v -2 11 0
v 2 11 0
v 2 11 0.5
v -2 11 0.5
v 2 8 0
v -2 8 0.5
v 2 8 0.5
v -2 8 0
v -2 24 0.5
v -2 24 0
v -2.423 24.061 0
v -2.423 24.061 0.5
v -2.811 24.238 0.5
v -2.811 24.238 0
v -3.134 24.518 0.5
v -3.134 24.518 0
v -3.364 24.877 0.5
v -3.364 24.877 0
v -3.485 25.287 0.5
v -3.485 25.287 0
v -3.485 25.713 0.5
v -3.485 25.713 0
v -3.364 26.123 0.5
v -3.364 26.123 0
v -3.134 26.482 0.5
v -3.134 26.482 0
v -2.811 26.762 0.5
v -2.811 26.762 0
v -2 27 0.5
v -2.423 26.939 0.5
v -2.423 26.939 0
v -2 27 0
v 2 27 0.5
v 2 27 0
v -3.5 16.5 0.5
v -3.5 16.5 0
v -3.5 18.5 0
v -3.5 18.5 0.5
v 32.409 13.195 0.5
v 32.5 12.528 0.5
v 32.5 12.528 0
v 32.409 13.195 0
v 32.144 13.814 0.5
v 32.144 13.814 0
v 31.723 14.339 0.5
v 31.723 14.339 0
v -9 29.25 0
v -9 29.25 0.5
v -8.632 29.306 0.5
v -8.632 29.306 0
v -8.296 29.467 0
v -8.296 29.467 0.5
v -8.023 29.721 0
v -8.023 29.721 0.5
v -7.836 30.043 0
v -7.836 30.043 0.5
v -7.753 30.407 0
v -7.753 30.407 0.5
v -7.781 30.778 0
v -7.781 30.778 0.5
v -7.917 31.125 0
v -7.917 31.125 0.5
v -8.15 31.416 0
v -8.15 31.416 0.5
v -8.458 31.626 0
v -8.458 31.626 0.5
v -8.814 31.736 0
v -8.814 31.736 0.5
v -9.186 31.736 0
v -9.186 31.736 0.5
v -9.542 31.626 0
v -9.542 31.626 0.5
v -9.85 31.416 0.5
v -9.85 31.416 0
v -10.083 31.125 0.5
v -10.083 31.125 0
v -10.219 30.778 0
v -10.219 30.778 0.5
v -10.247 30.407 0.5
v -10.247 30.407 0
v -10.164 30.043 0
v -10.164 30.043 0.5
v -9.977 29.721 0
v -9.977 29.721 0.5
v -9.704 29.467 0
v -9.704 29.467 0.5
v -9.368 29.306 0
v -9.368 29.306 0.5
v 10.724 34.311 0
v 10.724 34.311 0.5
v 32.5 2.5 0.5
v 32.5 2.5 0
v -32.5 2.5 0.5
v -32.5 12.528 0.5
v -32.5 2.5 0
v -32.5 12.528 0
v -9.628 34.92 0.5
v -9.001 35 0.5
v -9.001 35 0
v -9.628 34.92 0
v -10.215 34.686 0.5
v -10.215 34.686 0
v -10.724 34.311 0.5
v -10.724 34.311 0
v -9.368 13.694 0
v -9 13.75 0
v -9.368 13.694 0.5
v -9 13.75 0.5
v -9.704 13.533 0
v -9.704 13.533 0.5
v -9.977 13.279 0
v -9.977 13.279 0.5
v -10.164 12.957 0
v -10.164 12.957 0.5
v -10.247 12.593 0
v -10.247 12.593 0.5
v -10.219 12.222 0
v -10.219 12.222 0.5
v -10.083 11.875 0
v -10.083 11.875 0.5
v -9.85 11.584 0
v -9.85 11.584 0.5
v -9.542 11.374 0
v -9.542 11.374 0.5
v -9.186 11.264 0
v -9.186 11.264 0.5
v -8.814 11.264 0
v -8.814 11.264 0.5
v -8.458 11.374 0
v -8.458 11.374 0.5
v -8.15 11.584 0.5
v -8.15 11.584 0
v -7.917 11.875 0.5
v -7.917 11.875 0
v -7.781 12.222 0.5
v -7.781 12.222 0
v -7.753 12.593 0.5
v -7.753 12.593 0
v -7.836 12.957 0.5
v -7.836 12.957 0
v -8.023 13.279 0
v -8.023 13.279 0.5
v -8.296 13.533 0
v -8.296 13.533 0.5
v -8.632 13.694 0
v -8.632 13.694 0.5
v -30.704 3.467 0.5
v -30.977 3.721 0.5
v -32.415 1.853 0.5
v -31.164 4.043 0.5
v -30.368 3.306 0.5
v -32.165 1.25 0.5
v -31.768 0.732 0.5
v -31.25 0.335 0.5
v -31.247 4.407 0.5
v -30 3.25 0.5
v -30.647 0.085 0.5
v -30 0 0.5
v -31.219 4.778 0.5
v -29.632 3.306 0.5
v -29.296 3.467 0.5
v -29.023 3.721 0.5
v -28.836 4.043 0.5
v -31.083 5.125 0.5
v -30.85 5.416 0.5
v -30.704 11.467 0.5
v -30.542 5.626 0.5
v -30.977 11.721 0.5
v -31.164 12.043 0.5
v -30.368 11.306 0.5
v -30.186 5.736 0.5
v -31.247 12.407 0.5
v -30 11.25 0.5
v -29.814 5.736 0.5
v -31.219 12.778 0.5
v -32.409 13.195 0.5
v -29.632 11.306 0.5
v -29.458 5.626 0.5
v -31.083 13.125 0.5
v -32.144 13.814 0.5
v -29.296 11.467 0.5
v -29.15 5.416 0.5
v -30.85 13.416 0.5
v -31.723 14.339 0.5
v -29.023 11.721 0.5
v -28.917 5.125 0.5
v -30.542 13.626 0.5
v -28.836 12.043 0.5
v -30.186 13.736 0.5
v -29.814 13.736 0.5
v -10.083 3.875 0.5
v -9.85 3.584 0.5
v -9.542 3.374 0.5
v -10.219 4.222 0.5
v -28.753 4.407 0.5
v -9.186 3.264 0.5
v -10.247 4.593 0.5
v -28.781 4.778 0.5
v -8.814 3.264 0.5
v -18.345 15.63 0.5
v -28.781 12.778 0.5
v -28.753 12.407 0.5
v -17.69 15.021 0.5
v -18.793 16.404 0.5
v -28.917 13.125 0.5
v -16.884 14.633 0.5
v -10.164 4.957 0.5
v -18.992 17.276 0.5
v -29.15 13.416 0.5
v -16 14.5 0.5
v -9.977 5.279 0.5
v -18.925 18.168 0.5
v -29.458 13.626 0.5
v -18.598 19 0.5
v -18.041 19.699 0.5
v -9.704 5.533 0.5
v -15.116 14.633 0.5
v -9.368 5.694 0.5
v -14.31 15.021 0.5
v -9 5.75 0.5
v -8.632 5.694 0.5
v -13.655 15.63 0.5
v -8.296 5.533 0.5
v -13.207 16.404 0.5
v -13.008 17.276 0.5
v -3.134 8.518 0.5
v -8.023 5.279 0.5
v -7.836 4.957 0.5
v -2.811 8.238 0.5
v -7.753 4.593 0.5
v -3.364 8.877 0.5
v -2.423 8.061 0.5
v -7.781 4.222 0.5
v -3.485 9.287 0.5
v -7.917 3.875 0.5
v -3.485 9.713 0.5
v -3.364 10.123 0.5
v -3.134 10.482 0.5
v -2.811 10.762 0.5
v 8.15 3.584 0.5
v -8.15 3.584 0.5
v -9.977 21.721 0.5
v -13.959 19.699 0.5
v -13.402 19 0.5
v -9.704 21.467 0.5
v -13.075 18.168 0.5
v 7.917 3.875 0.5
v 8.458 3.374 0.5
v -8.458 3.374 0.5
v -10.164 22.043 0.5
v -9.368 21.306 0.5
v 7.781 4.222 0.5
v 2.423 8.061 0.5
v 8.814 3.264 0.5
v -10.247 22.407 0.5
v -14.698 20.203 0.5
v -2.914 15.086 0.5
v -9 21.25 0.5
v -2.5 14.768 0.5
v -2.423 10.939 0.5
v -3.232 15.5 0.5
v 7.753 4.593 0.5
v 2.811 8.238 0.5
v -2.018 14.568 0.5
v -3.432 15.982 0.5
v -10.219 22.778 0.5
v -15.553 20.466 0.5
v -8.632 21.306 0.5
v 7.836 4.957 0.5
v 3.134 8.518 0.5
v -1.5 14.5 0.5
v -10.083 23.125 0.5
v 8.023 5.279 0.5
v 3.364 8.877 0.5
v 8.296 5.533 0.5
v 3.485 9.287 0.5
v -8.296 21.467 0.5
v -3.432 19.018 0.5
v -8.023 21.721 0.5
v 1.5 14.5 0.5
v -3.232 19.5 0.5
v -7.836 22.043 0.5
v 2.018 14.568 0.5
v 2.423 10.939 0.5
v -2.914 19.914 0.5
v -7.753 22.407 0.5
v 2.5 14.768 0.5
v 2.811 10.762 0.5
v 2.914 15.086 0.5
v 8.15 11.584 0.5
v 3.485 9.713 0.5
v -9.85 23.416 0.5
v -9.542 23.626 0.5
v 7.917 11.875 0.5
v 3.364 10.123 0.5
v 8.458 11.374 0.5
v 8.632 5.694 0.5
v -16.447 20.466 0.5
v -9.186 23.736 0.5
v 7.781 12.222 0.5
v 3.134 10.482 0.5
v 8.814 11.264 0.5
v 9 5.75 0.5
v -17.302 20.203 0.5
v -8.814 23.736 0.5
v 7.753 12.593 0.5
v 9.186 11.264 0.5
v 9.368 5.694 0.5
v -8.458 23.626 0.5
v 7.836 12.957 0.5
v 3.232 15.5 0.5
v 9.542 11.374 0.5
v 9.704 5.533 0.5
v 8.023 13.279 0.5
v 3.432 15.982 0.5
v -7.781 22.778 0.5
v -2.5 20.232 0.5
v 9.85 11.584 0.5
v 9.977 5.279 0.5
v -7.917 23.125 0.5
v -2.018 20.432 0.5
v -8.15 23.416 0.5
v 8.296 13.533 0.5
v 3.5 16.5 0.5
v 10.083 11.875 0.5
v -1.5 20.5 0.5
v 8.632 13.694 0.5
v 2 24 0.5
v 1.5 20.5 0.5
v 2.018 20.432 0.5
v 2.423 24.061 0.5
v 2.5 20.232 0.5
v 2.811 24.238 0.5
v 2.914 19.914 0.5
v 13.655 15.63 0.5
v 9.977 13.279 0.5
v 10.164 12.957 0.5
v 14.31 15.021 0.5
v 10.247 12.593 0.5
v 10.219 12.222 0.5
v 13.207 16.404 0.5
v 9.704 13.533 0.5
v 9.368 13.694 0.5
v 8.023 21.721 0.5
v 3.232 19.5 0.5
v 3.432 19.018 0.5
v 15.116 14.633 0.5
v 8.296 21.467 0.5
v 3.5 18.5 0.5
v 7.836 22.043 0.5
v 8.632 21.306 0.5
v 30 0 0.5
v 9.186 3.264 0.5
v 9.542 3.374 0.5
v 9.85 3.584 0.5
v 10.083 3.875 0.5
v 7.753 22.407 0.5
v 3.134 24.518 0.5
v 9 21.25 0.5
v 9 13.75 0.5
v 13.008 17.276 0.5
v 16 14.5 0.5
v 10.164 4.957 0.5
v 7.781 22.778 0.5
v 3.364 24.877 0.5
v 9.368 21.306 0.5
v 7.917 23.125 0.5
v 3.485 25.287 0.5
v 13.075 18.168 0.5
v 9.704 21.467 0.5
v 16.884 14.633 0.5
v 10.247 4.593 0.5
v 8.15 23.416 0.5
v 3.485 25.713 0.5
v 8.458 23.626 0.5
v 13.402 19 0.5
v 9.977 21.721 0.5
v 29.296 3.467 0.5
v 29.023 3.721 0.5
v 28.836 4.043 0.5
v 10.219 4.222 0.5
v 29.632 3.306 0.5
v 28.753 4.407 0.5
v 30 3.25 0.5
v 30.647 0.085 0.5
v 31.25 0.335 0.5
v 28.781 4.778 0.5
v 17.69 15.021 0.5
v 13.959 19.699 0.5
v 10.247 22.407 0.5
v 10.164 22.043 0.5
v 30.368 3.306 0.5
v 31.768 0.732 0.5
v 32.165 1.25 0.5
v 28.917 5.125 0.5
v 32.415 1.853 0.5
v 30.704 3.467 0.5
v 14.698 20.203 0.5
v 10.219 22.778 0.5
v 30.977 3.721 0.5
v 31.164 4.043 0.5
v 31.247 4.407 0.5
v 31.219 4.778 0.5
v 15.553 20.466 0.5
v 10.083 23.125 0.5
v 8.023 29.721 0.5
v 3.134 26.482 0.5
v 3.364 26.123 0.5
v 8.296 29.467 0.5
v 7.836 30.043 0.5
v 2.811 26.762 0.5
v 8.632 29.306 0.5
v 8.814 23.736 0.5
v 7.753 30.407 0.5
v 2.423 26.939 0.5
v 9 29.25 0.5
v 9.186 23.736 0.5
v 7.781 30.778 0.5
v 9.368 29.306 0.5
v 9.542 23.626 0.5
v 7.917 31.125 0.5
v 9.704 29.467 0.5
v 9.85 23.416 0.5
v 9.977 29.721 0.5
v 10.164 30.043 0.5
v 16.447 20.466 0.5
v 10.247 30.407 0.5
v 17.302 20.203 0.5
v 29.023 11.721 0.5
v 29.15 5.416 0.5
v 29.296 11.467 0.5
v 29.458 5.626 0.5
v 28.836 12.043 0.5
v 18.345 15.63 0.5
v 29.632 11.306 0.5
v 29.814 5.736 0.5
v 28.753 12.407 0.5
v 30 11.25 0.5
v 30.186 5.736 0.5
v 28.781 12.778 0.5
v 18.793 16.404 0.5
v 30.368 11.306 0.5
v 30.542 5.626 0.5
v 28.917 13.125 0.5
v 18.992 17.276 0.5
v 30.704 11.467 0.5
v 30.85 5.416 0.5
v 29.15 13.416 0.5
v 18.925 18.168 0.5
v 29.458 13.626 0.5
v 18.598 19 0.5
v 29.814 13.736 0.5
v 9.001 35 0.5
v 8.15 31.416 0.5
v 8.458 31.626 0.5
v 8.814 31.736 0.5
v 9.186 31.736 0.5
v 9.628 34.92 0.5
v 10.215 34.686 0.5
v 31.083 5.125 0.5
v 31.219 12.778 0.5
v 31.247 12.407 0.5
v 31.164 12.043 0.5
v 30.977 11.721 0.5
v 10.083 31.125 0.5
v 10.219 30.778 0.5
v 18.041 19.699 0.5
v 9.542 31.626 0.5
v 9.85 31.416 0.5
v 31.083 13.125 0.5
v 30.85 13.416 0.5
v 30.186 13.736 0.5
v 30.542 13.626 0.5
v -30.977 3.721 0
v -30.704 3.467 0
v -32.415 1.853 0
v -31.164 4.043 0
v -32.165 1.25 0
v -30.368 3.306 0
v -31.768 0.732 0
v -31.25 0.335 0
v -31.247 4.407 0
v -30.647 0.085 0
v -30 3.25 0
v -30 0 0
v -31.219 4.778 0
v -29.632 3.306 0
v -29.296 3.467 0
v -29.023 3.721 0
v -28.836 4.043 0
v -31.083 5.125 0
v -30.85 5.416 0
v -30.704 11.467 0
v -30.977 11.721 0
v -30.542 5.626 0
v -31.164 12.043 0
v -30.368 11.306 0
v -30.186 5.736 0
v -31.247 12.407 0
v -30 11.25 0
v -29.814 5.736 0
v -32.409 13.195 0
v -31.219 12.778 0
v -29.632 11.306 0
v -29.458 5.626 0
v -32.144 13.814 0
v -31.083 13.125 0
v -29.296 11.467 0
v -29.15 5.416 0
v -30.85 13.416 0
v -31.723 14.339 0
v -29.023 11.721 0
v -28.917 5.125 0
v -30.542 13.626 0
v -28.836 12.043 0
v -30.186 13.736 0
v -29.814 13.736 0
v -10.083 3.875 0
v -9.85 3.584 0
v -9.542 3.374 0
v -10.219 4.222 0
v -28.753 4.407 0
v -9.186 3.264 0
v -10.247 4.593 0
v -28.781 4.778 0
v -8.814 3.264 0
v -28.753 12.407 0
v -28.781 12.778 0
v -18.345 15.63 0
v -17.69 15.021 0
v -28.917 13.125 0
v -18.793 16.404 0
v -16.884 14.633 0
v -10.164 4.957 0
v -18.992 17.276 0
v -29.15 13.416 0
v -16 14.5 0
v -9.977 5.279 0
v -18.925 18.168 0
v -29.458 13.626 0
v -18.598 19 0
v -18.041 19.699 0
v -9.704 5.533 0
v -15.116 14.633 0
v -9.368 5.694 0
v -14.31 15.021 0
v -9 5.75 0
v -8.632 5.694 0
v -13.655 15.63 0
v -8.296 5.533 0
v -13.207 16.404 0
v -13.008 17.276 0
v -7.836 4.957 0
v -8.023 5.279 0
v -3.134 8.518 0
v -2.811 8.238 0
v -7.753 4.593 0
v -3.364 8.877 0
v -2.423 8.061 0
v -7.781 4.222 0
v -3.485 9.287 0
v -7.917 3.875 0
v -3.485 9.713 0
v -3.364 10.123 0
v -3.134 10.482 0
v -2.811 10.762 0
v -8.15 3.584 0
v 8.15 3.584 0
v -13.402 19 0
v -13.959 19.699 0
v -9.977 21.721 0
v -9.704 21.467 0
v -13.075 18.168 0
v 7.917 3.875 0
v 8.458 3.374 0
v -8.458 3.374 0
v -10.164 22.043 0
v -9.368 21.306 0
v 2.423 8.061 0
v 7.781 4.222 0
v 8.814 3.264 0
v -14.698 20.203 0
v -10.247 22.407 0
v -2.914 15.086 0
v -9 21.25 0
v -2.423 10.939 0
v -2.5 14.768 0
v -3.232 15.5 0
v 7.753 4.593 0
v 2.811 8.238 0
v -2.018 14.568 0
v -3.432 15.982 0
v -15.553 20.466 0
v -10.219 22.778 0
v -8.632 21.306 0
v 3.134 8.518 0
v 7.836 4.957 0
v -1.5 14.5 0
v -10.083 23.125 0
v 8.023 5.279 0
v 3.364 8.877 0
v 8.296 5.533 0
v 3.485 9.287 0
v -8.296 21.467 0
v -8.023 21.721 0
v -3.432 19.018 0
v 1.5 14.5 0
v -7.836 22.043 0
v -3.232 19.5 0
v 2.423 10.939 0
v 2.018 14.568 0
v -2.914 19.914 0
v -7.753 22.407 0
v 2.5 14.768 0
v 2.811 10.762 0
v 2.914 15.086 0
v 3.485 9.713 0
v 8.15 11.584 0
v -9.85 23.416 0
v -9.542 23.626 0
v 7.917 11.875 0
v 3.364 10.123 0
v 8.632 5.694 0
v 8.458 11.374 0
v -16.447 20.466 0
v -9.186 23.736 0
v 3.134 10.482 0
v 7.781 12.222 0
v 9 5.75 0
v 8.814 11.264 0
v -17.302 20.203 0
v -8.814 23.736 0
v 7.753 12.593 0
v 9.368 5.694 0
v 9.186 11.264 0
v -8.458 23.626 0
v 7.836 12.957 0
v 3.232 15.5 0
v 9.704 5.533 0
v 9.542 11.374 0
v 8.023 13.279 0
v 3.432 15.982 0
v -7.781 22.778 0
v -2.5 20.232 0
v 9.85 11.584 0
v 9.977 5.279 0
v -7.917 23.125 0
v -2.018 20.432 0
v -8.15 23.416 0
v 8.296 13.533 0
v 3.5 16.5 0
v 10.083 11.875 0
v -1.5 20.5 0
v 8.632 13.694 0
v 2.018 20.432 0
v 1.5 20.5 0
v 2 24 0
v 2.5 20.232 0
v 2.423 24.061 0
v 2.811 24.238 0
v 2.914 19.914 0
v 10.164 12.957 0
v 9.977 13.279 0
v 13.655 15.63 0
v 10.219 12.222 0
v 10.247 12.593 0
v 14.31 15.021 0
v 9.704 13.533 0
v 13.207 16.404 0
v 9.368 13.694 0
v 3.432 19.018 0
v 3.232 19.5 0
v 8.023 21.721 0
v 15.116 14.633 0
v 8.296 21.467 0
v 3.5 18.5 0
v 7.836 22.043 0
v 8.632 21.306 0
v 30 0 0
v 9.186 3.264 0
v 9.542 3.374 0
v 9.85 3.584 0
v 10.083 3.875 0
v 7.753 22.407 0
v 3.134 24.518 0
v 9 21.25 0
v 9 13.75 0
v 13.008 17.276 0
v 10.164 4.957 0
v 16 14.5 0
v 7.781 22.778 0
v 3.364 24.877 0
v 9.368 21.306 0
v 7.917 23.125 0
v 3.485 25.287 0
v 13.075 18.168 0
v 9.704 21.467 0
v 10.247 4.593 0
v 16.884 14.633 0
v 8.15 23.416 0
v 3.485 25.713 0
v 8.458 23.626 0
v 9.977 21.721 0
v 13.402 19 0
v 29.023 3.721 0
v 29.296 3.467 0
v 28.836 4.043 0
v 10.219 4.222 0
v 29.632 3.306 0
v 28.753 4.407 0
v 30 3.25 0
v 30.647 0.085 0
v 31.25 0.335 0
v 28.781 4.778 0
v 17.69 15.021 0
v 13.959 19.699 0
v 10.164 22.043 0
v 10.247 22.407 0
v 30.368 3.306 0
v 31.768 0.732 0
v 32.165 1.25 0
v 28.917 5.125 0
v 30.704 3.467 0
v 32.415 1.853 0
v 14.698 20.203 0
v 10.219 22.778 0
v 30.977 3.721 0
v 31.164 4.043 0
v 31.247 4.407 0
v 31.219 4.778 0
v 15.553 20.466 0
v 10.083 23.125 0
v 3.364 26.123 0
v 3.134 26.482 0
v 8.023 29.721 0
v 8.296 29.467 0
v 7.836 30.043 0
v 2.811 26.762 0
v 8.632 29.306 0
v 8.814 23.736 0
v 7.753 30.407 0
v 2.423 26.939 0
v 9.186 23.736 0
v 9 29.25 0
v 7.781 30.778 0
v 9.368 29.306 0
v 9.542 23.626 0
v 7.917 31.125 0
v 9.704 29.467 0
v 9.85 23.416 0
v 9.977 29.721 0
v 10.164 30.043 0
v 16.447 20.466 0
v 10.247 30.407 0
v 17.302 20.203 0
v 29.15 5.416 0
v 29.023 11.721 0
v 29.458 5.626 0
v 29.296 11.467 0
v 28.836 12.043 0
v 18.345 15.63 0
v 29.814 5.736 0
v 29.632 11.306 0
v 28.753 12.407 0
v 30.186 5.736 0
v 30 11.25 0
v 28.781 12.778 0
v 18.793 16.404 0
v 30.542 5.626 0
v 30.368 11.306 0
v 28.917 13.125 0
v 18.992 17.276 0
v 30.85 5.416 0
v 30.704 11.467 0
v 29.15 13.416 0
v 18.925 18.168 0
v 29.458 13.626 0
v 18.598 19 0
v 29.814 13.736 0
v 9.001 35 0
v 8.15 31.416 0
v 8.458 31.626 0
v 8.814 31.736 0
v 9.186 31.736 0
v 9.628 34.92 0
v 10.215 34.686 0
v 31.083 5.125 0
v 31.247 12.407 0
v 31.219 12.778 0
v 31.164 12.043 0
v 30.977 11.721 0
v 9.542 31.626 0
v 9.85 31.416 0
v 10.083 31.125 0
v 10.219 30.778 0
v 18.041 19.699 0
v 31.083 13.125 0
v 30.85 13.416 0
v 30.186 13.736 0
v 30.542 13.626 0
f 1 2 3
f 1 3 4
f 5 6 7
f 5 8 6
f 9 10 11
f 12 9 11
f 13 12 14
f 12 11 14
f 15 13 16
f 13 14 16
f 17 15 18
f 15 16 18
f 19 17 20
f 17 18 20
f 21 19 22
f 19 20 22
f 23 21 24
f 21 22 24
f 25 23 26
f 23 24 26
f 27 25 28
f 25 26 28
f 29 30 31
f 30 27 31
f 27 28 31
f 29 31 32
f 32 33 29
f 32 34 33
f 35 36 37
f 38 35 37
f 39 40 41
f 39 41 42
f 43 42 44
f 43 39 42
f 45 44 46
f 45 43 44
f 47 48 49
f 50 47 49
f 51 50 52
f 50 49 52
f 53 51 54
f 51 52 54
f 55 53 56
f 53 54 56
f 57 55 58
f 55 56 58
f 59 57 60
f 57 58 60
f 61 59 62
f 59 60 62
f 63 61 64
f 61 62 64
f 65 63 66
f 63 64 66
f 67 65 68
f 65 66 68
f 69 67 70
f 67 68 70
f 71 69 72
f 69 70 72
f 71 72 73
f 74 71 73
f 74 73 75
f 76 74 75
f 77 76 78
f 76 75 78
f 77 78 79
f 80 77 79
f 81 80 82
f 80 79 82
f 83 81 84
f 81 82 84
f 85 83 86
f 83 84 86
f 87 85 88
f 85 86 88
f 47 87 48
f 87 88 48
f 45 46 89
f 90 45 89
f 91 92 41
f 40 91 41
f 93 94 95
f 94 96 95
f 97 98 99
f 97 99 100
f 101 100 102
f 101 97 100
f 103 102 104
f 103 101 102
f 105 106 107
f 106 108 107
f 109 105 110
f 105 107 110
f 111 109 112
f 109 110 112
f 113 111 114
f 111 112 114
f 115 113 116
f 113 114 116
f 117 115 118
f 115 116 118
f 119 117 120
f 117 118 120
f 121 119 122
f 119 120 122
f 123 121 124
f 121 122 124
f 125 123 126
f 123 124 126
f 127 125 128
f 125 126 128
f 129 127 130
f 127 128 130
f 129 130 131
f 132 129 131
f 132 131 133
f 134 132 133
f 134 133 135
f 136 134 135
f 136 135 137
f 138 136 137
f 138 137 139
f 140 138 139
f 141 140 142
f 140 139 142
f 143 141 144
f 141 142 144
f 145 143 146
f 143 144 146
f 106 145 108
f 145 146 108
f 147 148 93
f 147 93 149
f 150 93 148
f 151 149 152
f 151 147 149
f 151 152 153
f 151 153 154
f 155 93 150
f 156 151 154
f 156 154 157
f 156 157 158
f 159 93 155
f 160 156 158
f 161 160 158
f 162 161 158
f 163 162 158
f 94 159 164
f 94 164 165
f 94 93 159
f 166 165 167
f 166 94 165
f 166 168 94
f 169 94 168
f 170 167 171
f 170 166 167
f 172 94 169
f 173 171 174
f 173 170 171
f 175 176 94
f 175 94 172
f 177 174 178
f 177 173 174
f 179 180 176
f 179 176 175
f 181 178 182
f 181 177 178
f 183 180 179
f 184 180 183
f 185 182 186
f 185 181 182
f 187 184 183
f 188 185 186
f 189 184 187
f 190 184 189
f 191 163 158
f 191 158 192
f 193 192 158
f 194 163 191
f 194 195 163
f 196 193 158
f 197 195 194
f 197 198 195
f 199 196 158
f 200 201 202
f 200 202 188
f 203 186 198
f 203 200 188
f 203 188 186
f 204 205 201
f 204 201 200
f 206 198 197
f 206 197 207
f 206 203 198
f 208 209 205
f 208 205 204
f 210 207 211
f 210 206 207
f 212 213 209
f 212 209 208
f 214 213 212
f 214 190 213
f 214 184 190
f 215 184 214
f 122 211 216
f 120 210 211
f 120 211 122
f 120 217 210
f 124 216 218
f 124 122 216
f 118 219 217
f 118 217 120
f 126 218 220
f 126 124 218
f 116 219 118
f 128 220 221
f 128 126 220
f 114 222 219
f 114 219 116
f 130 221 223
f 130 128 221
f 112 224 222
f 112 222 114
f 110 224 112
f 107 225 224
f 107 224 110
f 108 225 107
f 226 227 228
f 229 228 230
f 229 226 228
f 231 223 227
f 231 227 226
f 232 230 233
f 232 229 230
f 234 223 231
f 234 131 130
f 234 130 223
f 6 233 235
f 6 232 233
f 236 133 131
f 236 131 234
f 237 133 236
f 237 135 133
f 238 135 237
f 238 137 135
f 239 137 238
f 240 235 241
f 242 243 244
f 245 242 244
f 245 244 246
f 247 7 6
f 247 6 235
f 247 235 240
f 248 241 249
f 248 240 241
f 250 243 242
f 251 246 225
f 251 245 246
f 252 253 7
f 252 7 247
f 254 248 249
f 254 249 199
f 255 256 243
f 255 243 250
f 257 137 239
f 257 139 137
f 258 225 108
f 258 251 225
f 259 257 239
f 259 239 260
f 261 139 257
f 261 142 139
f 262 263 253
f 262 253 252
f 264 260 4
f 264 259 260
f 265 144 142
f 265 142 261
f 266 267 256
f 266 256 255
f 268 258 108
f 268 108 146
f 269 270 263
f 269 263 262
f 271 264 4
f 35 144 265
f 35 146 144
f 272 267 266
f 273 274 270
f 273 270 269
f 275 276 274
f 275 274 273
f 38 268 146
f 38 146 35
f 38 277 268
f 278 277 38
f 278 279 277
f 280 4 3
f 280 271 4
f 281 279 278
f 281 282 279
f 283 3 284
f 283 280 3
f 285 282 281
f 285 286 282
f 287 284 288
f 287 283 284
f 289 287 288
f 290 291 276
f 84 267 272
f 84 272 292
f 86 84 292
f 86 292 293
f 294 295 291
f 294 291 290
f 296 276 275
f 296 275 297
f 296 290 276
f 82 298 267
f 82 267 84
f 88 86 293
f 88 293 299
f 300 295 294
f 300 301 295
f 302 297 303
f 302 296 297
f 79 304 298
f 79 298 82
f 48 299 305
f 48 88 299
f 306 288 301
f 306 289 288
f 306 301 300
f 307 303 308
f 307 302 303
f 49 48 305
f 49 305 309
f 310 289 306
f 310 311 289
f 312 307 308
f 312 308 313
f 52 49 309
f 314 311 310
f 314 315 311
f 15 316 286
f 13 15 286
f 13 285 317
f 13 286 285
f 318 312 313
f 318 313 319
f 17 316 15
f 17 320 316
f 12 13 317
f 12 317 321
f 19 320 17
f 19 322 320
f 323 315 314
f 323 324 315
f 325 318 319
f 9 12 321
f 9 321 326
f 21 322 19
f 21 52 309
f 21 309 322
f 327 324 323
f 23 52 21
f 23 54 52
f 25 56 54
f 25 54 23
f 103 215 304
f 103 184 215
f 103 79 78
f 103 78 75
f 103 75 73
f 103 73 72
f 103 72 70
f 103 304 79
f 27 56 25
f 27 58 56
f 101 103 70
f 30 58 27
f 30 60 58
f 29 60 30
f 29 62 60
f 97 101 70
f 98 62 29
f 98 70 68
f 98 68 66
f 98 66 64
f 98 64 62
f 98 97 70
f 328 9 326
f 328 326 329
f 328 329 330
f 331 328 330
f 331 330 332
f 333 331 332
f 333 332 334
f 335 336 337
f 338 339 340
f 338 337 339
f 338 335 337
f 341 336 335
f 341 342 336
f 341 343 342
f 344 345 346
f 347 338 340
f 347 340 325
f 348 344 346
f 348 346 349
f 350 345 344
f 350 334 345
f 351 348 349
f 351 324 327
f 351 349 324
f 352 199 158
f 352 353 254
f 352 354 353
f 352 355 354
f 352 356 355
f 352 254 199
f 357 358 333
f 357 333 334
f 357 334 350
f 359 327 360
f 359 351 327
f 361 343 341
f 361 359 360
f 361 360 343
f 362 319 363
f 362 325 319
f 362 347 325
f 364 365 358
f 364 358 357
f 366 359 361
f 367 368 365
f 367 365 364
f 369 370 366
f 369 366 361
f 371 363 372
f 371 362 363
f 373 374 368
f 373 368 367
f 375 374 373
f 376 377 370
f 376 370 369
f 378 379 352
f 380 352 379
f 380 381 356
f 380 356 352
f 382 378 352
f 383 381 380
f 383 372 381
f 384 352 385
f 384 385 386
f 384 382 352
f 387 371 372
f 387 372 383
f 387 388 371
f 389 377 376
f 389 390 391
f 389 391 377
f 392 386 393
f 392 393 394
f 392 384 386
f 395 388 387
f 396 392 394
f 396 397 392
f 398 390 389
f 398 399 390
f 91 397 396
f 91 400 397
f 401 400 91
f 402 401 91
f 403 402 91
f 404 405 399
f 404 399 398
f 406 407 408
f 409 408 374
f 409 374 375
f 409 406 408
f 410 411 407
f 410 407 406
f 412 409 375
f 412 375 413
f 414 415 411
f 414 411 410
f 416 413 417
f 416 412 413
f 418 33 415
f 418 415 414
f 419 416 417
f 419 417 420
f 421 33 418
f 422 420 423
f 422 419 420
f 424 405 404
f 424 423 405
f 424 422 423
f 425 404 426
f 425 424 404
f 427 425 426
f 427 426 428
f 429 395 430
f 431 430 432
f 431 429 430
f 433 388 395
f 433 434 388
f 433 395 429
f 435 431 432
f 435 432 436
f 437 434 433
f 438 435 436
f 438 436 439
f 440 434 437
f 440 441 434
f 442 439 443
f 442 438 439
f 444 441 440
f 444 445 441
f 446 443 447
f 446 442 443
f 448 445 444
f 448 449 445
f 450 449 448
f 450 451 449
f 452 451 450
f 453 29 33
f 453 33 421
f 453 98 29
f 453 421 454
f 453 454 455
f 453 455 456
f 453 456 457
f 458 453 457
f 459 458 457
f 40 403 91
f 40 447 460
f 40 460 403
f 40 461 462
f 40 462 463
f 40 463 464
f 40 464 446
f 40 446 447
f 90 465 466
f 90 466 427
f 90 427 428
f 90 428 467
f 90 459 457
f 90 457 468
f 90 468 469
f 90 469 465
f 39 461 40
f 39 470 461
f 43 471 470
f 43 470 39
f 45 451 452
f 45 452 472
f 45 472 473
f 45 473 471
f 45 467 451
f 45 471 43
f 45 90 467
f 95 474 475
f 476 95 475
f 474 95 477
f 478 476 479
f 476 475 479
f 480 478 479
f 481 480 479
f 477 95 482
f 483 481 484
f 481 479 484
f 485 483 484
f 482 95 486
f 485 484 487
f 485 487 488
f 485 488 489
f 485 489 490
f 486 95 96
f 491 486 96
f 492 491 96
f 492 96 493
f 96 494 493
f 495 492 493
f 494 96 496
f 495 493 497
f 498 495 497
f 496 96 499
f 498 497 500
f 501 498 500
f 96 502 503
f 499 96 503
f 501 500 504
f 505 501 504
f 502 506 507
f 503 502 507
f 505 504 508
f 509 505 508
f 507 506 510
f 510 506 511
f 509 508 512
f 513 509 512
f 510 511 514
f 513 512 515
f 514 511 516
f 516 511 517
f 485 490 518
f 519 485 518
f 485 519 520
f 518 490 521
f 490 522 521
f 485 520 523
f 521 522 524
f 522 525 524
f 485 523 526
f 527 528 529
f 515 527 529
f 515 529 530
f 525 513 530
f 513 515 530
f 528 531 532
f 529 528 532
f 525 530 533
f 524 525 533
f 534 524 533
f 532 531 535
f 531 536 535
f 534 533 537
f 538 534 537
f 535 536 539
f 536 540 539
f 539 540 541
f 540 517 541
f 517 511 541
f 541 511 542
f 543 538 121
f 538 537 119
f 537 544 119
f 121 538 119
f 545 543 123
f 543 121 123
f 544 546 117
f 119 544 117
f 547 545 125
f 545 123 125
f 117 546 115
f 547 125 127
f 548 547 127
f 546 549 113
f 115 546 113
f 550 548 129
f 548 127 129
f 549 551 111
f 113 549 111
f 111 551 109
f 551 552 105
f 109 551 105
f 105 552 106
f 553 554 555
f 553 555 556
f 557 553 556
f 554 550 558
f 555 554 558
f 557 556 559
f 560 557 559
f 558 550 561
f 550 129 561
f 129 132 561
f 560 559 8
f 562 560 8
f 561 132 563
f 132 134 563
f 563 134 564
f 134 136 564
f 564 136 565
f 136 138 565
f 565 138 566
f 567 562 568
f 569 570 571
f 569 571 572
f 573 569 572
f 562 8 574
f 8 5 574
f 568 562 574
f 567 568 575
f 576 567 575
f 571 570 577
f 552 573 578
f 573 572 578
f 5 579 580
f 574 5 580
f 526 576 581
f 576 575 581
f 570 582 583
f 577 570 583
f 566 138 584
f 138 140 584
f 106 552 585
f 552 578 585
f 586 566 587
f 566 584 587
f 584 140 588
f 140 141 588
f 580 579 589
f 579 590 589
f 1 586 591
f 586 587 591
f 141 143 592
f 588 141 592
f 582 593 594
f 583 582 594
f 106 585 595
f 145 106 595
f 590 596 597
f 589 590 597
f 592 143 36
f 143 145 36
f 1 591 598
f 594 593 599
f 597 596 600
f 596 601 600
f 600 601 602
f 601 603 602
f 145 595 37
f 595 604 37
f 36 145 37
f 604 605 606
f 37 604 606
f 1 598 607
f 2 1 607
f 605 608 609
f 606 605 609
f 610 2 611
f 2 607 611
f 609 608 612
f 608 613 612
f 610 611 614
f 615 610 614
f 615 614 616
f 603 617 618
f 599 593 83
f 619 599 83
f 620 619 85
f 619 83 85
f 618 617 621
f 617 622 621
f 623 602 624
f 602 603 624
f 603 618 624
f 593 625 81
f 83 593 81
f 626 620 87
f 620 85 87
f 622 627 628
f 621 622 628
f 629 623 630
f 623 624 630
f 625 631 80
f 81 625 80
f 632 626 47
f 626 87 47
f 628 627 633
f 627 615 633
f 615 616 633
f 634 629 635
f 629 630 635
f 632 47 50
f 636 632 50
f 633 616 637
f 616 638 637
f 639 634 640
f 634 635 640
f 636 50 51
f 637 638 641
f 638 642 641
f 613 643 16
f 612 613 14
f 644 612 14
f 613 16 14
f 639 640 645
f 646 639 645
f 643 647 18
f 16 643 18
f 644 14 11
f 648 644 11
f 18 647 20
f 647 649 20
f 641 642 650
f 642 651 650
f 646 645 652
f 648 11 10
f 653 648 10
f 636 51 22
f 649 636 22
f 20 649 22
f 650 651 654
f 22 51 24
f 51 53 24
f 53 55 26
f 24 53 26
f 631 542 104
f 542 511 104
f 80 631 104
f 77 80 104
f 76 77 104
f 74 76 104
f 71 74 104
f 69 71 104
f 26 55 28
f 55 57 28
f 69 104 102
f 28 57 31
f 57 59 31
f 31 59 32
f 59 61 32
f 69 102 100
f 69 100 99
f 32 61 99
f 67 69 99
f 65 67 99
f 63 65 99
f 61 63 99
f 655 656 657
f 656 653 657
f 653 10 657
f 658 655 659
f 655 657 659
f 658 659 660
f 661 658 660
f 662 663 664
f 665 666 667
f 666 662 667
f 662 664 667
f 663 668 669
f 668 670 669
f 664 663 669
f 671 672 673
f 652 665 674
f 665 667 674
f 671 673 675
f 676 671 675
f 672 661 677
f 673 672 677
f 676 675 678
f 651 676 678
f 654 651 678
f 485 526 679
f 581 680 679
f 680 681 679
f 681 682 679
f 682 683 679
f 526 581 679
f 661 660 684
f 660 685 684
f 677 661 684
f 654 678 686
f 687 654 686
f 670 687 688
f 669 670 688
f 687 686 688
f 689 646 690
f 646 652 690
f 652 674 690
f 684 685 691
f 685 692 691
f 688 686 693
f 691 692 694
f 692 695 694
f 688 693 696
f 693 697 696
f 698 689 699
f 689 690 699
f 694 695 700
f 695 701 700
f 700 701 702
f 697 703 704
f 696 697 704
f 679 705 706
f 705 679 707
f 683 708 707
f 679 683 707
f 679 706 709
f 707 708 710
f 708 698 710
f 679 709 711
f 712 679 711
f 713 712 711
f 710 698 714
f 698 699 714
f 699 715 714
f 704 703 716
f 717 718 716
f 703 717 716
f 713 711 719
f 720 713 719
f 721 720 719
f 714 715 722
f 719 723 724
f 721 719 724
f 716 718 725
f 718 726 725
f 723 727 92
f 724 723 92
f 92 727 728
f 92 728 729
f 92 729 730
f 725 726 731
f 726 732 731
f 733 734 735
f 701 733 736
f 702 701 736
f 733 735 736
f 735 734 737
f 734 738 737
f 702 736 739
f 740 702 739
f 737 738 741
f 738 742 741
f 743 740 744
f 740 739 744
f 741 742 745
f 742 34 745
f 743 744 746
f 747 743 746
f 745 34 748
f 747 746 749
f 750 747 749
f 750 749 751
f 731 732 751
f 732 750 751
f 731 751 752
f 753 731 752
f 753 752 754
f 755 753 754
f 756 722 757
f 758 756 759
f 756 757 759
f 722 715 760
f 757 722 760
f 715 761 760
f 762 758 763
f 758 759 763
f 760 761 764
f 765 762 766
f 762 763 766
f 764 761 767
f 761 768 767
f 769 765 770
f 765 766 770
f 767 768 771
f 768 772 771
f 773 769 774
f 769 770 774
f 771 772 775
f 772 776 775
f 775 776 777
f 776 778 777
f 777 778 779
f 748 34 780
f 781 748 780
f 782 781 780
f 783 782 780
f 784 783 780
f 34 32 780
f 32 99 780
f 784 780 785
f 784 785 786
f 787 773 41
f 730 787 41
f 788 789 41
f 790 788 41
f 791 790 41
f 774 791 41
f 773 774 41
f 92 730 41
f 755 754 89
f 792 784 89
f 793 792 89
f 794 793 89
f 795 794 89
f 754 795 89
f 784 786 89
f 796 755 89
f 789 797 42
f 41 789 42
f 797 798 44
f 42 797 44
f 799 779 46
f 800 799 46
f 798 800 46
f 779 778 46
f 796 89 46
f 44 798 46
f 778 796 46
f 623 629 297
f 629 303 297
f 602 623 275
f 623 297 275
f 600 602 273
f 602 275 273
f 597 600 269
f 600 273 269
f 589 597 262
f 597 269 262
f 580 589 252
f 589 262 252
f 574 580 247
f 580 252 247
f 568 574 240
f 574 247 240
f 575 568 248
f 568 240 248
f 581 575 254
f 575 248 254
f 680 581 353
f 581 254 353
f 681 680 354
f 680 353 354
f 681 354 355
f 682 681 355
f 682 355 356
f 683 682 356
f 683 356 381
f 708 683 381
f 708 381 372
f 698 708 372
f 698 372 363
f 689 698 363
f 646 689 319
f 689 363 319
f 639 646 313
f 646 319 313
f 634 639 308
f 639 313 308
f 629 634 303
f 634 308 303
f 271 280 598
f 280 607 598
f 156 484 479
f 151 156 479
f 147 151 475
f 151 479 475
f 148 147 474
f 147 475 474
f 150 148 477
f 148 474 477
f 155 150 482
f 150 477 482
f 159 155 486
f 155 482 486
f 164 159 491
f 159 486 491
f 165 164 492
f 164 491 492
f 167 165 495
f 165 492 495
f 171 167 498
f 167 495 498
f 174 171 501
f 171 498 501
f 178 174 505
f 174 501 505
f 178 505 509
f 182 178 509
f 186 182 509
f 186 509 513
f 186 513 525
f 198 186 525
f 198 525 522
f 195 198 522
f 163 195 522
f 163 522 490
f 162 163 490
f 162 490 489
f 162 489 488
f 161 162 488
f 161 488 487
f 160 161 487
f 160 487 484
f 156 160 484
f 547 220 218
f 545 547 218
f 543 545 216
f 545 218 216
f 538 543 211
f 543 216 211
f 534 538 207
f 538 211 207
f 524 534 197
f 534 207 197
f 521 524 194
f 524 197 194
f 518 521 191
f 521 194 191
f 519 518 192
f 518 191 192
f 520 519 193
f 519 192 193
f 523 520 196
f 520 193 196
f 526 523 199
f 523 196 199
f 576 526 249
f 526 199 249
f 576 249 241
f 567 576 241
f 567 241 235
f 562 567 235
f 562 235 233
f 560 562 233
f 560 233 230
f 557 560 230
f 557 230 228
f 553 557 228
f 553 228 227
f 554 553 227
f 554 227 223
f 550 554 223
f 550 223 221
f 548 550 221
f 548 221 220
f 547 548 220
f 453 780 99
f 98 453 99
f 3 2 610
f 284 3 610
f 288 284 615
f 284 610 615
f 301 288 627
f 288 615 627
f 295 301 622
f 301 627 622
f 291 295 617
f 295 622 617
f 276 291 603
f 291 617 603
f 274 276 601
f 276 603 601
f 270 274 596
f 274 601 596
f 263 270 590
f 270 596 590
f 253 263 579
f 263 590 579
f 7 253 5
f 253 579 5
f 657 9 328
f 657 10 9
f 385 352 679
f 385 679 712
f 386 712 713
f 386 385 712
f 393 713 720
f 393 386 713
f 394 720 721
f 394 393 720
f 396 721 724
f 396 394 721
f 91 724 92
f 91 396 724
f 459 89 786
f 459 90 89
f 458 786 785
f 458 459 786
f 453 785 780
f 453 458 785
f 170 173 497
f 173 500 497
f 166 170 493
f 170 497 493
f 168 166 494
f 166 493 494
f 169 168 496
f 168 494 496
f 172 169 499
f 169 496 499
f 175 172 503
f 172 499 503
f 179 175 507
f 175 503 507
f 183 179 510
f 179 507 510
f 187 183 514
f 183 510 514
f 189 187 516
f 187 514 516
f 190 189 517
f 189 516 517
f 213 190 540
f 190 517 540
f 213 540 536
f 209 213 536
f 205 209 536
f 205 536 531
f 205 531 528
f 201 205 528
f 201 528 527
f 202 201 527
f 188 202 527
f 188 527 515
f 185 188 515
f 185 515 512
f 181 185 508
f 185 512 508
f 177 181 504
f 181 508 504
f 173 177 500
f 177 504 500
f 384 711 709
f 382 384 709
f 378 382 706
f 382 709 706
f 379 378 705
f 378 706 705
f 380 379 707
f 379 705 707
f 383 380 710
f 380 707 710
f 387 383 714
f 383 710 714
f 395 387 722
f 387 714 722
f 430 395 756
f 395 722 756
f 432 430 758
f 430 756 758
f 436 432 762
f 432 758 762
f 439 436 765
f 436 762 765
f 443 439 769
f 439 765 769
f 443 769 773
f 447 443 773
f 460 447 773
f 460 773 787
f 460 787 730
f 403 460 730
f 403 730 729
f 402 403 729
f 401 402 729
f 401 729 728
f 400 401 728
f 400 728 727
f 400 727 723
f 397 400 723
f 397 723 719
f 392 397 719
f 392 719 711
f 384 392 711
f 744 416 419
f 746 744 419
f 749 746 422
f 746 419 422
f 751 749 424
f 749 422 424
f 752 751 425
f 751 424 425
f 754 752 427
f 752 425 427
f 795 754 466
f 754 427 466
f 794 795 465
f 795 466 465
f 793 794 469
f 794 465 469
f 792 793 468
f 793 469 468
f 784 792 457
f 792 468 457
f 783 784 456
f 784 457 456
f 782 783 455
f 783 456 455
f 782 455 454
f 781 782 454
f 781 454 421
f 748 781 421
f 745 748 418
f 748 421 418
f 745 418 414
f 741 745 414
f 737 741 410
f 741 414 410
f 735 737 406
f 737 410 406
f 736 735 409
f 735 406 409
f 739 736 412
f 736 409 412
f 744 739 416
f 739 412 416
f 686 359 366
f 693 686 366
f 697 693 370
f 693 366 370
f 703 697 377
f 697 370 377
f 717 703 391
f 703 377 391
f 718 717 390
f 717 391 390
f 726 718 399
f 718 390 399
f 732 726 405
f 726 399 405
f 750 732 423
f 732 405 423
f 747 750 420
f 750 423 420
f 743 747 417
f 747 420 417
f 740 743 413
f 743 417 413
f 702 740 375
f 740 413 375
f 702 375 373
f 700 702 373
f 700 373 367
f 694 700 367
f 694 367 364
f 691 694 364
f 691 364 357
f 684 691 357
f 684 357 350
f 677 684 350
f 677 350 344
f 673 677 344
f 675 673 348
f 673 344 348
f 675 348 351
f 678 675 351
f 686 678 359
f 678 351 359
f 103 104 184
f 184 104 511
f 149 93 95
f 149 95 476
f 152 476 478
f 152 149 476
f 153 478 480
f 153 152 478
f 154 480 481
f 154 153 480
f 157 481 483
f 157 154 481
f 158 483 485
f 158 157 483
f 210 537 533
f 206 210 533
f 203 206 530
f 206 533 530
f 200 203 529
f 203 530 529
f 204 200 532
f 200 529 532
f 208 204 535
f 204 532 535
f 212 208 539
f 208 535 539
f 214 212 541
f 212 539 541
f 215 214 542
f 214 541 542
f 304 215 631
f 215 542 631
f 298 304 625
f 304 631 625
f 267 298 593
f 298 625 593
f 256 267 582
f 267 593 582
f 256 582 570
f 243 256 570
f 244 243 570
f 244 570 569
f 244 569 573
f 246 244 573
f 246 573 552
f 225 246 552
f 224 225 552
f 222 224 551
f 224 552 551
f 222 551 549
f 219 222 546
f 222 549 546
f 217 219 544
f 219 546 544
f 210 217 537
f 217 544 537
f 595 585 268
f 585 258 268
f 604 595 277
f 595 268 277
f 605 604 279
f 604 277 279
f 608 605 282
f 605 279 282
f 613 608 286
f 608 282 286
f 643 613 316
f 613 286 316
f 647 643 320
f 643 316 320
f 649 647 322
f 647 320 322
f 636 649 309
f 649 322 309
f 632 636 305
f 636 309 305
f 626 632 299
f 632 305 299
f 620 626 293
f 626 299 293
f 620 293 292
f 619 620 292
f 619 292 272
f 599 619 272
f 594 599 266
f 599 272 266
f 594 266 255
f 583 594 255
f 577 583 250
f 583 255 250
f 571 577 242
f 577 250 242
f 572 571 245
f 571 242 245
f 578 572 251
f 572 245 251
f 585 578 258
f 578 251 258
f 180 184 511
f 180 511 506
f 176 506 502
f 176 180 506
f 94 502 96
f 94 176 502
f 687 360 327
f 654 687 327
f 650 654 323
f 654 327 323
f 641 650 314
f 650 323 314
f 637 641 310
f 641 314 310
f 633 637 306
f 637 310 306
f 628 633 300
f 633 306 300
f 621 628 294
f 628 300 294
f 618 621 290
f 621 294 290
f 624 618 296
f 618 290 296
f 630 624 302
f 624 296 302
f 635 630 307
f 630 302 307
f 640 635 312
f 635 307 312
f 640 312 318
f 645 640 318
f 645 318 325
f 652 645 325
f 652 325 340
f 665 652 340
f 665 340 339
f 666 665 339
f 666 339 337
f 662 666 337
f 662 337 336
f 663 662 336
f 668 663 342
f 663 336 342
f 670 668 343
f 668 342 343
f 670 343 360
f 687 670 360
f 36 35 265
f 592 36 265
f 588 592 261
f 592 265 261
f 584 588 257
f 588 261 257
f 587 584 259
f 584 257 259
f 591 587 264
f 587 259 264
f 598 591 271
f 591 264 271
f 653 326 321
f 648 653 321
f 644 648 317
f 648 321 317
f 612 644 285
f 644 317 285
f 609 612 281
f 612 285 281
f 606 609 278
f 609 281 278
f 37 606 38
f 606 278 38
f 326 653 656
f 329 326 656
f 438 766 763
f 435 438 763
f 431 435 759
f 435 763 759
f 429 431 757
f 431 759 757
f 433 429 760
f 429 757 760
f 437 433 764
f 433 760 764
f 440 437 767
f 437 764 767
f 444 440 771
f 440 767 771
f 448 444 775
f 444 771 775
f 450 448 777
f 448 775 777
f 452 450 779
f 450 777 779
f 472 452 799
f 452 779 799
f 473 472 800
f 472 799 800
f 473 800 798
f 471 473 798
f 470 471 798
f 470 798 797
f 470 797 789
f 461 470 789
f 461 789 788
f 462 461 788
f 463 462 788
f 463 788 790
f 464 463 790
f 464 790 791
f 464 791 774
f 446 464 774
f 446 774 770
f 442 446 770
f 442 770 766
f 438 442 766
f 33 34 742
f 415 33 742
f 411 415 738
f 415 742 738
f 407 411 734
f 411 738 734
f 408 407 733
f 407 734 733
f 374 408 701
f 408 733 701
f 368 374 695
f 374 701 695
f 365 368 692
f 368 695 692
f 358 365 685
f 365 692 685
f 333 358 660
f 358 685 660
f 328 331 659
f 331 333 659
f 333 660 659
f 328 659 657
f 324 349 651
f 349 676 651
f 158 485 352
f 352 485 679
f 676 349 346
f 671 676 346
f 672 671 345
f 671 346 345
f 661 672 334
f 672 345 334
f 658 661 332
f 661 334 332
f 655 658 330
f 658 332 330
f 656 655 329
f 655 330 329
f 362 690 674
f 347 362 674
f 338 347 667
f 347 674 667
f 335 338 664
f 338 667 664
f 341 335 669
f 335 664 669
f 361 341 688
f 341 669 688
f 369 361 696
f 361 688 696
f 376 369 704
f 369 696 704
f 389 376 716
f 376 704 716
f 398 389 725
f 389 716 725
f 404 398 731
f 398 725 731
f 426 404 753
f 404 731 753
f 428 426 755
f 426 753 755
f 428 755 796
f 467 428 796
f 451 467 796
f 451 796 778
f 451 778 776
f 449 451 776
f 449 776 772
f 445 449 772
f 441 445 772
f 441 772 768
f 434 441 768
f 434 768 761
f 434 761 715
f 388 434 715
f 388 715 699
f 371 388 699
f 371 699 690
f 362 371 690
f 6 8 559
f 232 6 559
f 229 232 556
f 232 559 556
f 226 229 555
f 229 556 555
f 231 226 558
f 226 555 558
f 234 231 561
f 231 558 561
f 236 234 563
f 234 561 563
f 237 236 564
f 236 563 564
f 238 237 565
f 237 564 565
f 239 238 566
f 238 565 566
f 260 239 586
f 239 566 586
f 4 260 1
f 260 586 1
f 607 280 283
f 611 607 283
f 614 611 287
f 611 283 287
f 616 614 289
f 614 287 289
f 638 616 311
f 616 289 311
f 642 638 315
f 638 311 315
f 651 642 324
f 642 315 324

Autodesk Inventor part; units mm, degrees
ref_plane "YZ Plane" through (0, 0, 0) normal (1, 0, 0) x (0, 1, 0)
ref_plane "XZ Plane" through (0, 0, 0) normal (0, 1, 0) x (-1, 0, 0)
sketch "Sketch1" plane through (0, 0, 0) normal (0, 0, 1) x (1, 0, 0)
  line L0 (-32.5, 0) -> (32.5, 0)
  line L1 (32.5, 0) -> (32.5, 13.6)
  line L2 (32.5, 13.6) -> (10, 35)
  line L3 (10, 35) -> (-10, 35)
  line L4 (-10, 35) -> (-32.5, 13.6)
  line L5 (-32.5, 13.6) -> (-32.5, 0)
  line L6 (0, 0) -> (0, 41.5771) construction
  dimension "d0" = 13.6
  dimension "d1" = 65
  dimension "d2" = 35
  dimension "d3" = 20
extrude "Extrusion1" add sketch "Sketch1" along normal blind 0.5
fillet "Fillet1" radius 2.5 4 edges at (-32.5, 13.6, 0.25) (32.5, 13.6, 0.25) (10, 35, 0.25) (-10, 35, 0.25)
sketch "Sketch2" plane through (0, 0, 0.5) normal (0, 0, 1) x (1, 0, 0)
  arc A0 (-9.001, 35) -> (-10.7239, 34.3115) centre (-9.001, 32.5) ccw projected
  line L0 (9.001, 35) -> (-9.001, 35) projected
  line L1 (-32.5, 0) -> (32.5, 0) projected
  point P0 (0, 0)
  point P1 (0, 35)
  point P2 (-30, 12.5)
  point P3 (30, 12.5)
  point P4 (30, 4.5)
  point P5 (-30, 4.5)
  point P6 (0, 0)
  point P7 (-16, 17.5)
  point P8 (16, 17.5)
  point P9 (0, 35)
  dimension "d9" = 60
  dimension "d10" = 30
  dimension "d11" = 4.5
  dimension "d12" = 8
  dimension "d13" = 16
  dimension "d14" = 32
  dimension "d15" = 5
hole "Hole1" at (-16, 17.5, 0.5) at (16, 17.5, 0.5) direction (0, 0, -1) diameter 6 depth 0.5
hole "Hole2" at (-30, 12.5, 0.5) at (30, 12.5, 0.5) at (30, 4.5, 0.5) at (-30, 4.5, 0.5) direction (0, 0, -1) diameter 2.5 depth 0.5
sketch "Sketch3" plane through (0, 0, 0) normal (0, 0, -1) x (-1, 0, 0)
  line L0 (-3.5, 14.5) -> (3.5, 14.5)
  line L1 (3.5, 14.5) -> (3.5, 20.5)
  line L2 (3.5, 20.5) -> (-3.5, 20.5)
  line L3 (-3.5, 20.5) -> (-3.5, 14.5)
  line L4 (-3.5, 14.5) -> (3.5, 20.5) construction
  line L5 (3.5, 14.5) -> (-3.5, 20.5) construction
  circle A0 centre (-16, 17.5) radius 3 projected
  line L6 (32.5, 0) -> (-32.5, 0) projected
  point P0 (0, 0)
  point P1 (0, 17.5)
  point P2 (-3.5, 17.5)
  point P3 (0, 0)
  dimension "d30" = 7
  dimension "d31" = 6
extrude "Extrusion2" cut sketch "Sketch3" against normal up to surface (0.5 mm away) contours L3 L2 L1 L0
fillet "Fillet2" radius 2 4 edges at (3.5, 20.5, 0.25) (-3.5, 20.5, 0.25) (-3.5, 14.5, 0.25) (3.5, 14.5, 0.25)
sketch "Sketch4" plane through (0, 0, 0) normal (0, 0, -1) x (-1, 0, 0)
  line L0 (-2, 9.5) -> (2, 9.5) construction
  line L1 (-2, 11) -> (2, 11)
  line L2 (2, 8) -> (-2, 8)
  arc A0 (-2, 11) -> (-2, 8) centre (-2, 9.5) ccw
  arc A1 (2, 8) -> (2, 11) centre (2, 9.5) ccw
  line L3 (32.5, 0) -> (-32.5, 0) projected
  circle A2 centre (30, 12.5) radius 1.25 projected
  point P0 (0, 0)
  point P1 (0, 9.5)
  point P2 (0, 0)
  point P3 (0, 0)
  point P4 (0, 0)
  point P5 (0, 0)
  dimension "d35" = 1.5
  dimension "d37" = 4
  dimension "d39" = 3
  dimension "d40" = 2
extrude "Extrusion3" cut sketch "Sketch4" against normal up to surface (0.5 mm away) contours L1 A1 L2 A0
ref_plane "Work Plane1" through (-9.001, 17.5, 0) normal (0, 1, 0) x (1, 0, 0)
mirror "Mirror1" about plane through (-9.001, 17.5, 0) normal (0, 1, 0) of "Extrusion3"
sketch "Sketch5" plane through (0, 0, 0) normal (0, 0, -1) x (-1, 0, 0)
  circle A0 centre (-30, 12.5) radius 1.25 projected
  line L0 (32.5, 0) -> (-32.5, 0) projected
  point P0 (0, 0)
  point P1 (-9, 12.5)
  point P2 (9, 12.5)
  point P3 (0, 0)
  point P4 (-9, 4.5)
  point P5 (9, 4.5)
  dimension "d44" = 18
  dimension "d45" = 9
  dimension "d46" = 4.5
hole "Hole3" at (9, 12.5, 0) at (-9, 12.5, 0) at (9, 4.5, 0) at (-9, 4.5, 0) direction (0, 0, 1) diameter 2.5 depth 0.5
mirror "Mirror2" about plane through (-9.001, 17.5, 0) normal (0, 1, 0) of "Hole3"
fillet "Fillet3" radius 2.5 2 edges at (-32.5, 0, 0.25) (32.5, 0, 0.25)
equation "\"d10\" = 0.5 * d9"
equation "\"d45\" = 0.5 * d44"
properties part number "16"
